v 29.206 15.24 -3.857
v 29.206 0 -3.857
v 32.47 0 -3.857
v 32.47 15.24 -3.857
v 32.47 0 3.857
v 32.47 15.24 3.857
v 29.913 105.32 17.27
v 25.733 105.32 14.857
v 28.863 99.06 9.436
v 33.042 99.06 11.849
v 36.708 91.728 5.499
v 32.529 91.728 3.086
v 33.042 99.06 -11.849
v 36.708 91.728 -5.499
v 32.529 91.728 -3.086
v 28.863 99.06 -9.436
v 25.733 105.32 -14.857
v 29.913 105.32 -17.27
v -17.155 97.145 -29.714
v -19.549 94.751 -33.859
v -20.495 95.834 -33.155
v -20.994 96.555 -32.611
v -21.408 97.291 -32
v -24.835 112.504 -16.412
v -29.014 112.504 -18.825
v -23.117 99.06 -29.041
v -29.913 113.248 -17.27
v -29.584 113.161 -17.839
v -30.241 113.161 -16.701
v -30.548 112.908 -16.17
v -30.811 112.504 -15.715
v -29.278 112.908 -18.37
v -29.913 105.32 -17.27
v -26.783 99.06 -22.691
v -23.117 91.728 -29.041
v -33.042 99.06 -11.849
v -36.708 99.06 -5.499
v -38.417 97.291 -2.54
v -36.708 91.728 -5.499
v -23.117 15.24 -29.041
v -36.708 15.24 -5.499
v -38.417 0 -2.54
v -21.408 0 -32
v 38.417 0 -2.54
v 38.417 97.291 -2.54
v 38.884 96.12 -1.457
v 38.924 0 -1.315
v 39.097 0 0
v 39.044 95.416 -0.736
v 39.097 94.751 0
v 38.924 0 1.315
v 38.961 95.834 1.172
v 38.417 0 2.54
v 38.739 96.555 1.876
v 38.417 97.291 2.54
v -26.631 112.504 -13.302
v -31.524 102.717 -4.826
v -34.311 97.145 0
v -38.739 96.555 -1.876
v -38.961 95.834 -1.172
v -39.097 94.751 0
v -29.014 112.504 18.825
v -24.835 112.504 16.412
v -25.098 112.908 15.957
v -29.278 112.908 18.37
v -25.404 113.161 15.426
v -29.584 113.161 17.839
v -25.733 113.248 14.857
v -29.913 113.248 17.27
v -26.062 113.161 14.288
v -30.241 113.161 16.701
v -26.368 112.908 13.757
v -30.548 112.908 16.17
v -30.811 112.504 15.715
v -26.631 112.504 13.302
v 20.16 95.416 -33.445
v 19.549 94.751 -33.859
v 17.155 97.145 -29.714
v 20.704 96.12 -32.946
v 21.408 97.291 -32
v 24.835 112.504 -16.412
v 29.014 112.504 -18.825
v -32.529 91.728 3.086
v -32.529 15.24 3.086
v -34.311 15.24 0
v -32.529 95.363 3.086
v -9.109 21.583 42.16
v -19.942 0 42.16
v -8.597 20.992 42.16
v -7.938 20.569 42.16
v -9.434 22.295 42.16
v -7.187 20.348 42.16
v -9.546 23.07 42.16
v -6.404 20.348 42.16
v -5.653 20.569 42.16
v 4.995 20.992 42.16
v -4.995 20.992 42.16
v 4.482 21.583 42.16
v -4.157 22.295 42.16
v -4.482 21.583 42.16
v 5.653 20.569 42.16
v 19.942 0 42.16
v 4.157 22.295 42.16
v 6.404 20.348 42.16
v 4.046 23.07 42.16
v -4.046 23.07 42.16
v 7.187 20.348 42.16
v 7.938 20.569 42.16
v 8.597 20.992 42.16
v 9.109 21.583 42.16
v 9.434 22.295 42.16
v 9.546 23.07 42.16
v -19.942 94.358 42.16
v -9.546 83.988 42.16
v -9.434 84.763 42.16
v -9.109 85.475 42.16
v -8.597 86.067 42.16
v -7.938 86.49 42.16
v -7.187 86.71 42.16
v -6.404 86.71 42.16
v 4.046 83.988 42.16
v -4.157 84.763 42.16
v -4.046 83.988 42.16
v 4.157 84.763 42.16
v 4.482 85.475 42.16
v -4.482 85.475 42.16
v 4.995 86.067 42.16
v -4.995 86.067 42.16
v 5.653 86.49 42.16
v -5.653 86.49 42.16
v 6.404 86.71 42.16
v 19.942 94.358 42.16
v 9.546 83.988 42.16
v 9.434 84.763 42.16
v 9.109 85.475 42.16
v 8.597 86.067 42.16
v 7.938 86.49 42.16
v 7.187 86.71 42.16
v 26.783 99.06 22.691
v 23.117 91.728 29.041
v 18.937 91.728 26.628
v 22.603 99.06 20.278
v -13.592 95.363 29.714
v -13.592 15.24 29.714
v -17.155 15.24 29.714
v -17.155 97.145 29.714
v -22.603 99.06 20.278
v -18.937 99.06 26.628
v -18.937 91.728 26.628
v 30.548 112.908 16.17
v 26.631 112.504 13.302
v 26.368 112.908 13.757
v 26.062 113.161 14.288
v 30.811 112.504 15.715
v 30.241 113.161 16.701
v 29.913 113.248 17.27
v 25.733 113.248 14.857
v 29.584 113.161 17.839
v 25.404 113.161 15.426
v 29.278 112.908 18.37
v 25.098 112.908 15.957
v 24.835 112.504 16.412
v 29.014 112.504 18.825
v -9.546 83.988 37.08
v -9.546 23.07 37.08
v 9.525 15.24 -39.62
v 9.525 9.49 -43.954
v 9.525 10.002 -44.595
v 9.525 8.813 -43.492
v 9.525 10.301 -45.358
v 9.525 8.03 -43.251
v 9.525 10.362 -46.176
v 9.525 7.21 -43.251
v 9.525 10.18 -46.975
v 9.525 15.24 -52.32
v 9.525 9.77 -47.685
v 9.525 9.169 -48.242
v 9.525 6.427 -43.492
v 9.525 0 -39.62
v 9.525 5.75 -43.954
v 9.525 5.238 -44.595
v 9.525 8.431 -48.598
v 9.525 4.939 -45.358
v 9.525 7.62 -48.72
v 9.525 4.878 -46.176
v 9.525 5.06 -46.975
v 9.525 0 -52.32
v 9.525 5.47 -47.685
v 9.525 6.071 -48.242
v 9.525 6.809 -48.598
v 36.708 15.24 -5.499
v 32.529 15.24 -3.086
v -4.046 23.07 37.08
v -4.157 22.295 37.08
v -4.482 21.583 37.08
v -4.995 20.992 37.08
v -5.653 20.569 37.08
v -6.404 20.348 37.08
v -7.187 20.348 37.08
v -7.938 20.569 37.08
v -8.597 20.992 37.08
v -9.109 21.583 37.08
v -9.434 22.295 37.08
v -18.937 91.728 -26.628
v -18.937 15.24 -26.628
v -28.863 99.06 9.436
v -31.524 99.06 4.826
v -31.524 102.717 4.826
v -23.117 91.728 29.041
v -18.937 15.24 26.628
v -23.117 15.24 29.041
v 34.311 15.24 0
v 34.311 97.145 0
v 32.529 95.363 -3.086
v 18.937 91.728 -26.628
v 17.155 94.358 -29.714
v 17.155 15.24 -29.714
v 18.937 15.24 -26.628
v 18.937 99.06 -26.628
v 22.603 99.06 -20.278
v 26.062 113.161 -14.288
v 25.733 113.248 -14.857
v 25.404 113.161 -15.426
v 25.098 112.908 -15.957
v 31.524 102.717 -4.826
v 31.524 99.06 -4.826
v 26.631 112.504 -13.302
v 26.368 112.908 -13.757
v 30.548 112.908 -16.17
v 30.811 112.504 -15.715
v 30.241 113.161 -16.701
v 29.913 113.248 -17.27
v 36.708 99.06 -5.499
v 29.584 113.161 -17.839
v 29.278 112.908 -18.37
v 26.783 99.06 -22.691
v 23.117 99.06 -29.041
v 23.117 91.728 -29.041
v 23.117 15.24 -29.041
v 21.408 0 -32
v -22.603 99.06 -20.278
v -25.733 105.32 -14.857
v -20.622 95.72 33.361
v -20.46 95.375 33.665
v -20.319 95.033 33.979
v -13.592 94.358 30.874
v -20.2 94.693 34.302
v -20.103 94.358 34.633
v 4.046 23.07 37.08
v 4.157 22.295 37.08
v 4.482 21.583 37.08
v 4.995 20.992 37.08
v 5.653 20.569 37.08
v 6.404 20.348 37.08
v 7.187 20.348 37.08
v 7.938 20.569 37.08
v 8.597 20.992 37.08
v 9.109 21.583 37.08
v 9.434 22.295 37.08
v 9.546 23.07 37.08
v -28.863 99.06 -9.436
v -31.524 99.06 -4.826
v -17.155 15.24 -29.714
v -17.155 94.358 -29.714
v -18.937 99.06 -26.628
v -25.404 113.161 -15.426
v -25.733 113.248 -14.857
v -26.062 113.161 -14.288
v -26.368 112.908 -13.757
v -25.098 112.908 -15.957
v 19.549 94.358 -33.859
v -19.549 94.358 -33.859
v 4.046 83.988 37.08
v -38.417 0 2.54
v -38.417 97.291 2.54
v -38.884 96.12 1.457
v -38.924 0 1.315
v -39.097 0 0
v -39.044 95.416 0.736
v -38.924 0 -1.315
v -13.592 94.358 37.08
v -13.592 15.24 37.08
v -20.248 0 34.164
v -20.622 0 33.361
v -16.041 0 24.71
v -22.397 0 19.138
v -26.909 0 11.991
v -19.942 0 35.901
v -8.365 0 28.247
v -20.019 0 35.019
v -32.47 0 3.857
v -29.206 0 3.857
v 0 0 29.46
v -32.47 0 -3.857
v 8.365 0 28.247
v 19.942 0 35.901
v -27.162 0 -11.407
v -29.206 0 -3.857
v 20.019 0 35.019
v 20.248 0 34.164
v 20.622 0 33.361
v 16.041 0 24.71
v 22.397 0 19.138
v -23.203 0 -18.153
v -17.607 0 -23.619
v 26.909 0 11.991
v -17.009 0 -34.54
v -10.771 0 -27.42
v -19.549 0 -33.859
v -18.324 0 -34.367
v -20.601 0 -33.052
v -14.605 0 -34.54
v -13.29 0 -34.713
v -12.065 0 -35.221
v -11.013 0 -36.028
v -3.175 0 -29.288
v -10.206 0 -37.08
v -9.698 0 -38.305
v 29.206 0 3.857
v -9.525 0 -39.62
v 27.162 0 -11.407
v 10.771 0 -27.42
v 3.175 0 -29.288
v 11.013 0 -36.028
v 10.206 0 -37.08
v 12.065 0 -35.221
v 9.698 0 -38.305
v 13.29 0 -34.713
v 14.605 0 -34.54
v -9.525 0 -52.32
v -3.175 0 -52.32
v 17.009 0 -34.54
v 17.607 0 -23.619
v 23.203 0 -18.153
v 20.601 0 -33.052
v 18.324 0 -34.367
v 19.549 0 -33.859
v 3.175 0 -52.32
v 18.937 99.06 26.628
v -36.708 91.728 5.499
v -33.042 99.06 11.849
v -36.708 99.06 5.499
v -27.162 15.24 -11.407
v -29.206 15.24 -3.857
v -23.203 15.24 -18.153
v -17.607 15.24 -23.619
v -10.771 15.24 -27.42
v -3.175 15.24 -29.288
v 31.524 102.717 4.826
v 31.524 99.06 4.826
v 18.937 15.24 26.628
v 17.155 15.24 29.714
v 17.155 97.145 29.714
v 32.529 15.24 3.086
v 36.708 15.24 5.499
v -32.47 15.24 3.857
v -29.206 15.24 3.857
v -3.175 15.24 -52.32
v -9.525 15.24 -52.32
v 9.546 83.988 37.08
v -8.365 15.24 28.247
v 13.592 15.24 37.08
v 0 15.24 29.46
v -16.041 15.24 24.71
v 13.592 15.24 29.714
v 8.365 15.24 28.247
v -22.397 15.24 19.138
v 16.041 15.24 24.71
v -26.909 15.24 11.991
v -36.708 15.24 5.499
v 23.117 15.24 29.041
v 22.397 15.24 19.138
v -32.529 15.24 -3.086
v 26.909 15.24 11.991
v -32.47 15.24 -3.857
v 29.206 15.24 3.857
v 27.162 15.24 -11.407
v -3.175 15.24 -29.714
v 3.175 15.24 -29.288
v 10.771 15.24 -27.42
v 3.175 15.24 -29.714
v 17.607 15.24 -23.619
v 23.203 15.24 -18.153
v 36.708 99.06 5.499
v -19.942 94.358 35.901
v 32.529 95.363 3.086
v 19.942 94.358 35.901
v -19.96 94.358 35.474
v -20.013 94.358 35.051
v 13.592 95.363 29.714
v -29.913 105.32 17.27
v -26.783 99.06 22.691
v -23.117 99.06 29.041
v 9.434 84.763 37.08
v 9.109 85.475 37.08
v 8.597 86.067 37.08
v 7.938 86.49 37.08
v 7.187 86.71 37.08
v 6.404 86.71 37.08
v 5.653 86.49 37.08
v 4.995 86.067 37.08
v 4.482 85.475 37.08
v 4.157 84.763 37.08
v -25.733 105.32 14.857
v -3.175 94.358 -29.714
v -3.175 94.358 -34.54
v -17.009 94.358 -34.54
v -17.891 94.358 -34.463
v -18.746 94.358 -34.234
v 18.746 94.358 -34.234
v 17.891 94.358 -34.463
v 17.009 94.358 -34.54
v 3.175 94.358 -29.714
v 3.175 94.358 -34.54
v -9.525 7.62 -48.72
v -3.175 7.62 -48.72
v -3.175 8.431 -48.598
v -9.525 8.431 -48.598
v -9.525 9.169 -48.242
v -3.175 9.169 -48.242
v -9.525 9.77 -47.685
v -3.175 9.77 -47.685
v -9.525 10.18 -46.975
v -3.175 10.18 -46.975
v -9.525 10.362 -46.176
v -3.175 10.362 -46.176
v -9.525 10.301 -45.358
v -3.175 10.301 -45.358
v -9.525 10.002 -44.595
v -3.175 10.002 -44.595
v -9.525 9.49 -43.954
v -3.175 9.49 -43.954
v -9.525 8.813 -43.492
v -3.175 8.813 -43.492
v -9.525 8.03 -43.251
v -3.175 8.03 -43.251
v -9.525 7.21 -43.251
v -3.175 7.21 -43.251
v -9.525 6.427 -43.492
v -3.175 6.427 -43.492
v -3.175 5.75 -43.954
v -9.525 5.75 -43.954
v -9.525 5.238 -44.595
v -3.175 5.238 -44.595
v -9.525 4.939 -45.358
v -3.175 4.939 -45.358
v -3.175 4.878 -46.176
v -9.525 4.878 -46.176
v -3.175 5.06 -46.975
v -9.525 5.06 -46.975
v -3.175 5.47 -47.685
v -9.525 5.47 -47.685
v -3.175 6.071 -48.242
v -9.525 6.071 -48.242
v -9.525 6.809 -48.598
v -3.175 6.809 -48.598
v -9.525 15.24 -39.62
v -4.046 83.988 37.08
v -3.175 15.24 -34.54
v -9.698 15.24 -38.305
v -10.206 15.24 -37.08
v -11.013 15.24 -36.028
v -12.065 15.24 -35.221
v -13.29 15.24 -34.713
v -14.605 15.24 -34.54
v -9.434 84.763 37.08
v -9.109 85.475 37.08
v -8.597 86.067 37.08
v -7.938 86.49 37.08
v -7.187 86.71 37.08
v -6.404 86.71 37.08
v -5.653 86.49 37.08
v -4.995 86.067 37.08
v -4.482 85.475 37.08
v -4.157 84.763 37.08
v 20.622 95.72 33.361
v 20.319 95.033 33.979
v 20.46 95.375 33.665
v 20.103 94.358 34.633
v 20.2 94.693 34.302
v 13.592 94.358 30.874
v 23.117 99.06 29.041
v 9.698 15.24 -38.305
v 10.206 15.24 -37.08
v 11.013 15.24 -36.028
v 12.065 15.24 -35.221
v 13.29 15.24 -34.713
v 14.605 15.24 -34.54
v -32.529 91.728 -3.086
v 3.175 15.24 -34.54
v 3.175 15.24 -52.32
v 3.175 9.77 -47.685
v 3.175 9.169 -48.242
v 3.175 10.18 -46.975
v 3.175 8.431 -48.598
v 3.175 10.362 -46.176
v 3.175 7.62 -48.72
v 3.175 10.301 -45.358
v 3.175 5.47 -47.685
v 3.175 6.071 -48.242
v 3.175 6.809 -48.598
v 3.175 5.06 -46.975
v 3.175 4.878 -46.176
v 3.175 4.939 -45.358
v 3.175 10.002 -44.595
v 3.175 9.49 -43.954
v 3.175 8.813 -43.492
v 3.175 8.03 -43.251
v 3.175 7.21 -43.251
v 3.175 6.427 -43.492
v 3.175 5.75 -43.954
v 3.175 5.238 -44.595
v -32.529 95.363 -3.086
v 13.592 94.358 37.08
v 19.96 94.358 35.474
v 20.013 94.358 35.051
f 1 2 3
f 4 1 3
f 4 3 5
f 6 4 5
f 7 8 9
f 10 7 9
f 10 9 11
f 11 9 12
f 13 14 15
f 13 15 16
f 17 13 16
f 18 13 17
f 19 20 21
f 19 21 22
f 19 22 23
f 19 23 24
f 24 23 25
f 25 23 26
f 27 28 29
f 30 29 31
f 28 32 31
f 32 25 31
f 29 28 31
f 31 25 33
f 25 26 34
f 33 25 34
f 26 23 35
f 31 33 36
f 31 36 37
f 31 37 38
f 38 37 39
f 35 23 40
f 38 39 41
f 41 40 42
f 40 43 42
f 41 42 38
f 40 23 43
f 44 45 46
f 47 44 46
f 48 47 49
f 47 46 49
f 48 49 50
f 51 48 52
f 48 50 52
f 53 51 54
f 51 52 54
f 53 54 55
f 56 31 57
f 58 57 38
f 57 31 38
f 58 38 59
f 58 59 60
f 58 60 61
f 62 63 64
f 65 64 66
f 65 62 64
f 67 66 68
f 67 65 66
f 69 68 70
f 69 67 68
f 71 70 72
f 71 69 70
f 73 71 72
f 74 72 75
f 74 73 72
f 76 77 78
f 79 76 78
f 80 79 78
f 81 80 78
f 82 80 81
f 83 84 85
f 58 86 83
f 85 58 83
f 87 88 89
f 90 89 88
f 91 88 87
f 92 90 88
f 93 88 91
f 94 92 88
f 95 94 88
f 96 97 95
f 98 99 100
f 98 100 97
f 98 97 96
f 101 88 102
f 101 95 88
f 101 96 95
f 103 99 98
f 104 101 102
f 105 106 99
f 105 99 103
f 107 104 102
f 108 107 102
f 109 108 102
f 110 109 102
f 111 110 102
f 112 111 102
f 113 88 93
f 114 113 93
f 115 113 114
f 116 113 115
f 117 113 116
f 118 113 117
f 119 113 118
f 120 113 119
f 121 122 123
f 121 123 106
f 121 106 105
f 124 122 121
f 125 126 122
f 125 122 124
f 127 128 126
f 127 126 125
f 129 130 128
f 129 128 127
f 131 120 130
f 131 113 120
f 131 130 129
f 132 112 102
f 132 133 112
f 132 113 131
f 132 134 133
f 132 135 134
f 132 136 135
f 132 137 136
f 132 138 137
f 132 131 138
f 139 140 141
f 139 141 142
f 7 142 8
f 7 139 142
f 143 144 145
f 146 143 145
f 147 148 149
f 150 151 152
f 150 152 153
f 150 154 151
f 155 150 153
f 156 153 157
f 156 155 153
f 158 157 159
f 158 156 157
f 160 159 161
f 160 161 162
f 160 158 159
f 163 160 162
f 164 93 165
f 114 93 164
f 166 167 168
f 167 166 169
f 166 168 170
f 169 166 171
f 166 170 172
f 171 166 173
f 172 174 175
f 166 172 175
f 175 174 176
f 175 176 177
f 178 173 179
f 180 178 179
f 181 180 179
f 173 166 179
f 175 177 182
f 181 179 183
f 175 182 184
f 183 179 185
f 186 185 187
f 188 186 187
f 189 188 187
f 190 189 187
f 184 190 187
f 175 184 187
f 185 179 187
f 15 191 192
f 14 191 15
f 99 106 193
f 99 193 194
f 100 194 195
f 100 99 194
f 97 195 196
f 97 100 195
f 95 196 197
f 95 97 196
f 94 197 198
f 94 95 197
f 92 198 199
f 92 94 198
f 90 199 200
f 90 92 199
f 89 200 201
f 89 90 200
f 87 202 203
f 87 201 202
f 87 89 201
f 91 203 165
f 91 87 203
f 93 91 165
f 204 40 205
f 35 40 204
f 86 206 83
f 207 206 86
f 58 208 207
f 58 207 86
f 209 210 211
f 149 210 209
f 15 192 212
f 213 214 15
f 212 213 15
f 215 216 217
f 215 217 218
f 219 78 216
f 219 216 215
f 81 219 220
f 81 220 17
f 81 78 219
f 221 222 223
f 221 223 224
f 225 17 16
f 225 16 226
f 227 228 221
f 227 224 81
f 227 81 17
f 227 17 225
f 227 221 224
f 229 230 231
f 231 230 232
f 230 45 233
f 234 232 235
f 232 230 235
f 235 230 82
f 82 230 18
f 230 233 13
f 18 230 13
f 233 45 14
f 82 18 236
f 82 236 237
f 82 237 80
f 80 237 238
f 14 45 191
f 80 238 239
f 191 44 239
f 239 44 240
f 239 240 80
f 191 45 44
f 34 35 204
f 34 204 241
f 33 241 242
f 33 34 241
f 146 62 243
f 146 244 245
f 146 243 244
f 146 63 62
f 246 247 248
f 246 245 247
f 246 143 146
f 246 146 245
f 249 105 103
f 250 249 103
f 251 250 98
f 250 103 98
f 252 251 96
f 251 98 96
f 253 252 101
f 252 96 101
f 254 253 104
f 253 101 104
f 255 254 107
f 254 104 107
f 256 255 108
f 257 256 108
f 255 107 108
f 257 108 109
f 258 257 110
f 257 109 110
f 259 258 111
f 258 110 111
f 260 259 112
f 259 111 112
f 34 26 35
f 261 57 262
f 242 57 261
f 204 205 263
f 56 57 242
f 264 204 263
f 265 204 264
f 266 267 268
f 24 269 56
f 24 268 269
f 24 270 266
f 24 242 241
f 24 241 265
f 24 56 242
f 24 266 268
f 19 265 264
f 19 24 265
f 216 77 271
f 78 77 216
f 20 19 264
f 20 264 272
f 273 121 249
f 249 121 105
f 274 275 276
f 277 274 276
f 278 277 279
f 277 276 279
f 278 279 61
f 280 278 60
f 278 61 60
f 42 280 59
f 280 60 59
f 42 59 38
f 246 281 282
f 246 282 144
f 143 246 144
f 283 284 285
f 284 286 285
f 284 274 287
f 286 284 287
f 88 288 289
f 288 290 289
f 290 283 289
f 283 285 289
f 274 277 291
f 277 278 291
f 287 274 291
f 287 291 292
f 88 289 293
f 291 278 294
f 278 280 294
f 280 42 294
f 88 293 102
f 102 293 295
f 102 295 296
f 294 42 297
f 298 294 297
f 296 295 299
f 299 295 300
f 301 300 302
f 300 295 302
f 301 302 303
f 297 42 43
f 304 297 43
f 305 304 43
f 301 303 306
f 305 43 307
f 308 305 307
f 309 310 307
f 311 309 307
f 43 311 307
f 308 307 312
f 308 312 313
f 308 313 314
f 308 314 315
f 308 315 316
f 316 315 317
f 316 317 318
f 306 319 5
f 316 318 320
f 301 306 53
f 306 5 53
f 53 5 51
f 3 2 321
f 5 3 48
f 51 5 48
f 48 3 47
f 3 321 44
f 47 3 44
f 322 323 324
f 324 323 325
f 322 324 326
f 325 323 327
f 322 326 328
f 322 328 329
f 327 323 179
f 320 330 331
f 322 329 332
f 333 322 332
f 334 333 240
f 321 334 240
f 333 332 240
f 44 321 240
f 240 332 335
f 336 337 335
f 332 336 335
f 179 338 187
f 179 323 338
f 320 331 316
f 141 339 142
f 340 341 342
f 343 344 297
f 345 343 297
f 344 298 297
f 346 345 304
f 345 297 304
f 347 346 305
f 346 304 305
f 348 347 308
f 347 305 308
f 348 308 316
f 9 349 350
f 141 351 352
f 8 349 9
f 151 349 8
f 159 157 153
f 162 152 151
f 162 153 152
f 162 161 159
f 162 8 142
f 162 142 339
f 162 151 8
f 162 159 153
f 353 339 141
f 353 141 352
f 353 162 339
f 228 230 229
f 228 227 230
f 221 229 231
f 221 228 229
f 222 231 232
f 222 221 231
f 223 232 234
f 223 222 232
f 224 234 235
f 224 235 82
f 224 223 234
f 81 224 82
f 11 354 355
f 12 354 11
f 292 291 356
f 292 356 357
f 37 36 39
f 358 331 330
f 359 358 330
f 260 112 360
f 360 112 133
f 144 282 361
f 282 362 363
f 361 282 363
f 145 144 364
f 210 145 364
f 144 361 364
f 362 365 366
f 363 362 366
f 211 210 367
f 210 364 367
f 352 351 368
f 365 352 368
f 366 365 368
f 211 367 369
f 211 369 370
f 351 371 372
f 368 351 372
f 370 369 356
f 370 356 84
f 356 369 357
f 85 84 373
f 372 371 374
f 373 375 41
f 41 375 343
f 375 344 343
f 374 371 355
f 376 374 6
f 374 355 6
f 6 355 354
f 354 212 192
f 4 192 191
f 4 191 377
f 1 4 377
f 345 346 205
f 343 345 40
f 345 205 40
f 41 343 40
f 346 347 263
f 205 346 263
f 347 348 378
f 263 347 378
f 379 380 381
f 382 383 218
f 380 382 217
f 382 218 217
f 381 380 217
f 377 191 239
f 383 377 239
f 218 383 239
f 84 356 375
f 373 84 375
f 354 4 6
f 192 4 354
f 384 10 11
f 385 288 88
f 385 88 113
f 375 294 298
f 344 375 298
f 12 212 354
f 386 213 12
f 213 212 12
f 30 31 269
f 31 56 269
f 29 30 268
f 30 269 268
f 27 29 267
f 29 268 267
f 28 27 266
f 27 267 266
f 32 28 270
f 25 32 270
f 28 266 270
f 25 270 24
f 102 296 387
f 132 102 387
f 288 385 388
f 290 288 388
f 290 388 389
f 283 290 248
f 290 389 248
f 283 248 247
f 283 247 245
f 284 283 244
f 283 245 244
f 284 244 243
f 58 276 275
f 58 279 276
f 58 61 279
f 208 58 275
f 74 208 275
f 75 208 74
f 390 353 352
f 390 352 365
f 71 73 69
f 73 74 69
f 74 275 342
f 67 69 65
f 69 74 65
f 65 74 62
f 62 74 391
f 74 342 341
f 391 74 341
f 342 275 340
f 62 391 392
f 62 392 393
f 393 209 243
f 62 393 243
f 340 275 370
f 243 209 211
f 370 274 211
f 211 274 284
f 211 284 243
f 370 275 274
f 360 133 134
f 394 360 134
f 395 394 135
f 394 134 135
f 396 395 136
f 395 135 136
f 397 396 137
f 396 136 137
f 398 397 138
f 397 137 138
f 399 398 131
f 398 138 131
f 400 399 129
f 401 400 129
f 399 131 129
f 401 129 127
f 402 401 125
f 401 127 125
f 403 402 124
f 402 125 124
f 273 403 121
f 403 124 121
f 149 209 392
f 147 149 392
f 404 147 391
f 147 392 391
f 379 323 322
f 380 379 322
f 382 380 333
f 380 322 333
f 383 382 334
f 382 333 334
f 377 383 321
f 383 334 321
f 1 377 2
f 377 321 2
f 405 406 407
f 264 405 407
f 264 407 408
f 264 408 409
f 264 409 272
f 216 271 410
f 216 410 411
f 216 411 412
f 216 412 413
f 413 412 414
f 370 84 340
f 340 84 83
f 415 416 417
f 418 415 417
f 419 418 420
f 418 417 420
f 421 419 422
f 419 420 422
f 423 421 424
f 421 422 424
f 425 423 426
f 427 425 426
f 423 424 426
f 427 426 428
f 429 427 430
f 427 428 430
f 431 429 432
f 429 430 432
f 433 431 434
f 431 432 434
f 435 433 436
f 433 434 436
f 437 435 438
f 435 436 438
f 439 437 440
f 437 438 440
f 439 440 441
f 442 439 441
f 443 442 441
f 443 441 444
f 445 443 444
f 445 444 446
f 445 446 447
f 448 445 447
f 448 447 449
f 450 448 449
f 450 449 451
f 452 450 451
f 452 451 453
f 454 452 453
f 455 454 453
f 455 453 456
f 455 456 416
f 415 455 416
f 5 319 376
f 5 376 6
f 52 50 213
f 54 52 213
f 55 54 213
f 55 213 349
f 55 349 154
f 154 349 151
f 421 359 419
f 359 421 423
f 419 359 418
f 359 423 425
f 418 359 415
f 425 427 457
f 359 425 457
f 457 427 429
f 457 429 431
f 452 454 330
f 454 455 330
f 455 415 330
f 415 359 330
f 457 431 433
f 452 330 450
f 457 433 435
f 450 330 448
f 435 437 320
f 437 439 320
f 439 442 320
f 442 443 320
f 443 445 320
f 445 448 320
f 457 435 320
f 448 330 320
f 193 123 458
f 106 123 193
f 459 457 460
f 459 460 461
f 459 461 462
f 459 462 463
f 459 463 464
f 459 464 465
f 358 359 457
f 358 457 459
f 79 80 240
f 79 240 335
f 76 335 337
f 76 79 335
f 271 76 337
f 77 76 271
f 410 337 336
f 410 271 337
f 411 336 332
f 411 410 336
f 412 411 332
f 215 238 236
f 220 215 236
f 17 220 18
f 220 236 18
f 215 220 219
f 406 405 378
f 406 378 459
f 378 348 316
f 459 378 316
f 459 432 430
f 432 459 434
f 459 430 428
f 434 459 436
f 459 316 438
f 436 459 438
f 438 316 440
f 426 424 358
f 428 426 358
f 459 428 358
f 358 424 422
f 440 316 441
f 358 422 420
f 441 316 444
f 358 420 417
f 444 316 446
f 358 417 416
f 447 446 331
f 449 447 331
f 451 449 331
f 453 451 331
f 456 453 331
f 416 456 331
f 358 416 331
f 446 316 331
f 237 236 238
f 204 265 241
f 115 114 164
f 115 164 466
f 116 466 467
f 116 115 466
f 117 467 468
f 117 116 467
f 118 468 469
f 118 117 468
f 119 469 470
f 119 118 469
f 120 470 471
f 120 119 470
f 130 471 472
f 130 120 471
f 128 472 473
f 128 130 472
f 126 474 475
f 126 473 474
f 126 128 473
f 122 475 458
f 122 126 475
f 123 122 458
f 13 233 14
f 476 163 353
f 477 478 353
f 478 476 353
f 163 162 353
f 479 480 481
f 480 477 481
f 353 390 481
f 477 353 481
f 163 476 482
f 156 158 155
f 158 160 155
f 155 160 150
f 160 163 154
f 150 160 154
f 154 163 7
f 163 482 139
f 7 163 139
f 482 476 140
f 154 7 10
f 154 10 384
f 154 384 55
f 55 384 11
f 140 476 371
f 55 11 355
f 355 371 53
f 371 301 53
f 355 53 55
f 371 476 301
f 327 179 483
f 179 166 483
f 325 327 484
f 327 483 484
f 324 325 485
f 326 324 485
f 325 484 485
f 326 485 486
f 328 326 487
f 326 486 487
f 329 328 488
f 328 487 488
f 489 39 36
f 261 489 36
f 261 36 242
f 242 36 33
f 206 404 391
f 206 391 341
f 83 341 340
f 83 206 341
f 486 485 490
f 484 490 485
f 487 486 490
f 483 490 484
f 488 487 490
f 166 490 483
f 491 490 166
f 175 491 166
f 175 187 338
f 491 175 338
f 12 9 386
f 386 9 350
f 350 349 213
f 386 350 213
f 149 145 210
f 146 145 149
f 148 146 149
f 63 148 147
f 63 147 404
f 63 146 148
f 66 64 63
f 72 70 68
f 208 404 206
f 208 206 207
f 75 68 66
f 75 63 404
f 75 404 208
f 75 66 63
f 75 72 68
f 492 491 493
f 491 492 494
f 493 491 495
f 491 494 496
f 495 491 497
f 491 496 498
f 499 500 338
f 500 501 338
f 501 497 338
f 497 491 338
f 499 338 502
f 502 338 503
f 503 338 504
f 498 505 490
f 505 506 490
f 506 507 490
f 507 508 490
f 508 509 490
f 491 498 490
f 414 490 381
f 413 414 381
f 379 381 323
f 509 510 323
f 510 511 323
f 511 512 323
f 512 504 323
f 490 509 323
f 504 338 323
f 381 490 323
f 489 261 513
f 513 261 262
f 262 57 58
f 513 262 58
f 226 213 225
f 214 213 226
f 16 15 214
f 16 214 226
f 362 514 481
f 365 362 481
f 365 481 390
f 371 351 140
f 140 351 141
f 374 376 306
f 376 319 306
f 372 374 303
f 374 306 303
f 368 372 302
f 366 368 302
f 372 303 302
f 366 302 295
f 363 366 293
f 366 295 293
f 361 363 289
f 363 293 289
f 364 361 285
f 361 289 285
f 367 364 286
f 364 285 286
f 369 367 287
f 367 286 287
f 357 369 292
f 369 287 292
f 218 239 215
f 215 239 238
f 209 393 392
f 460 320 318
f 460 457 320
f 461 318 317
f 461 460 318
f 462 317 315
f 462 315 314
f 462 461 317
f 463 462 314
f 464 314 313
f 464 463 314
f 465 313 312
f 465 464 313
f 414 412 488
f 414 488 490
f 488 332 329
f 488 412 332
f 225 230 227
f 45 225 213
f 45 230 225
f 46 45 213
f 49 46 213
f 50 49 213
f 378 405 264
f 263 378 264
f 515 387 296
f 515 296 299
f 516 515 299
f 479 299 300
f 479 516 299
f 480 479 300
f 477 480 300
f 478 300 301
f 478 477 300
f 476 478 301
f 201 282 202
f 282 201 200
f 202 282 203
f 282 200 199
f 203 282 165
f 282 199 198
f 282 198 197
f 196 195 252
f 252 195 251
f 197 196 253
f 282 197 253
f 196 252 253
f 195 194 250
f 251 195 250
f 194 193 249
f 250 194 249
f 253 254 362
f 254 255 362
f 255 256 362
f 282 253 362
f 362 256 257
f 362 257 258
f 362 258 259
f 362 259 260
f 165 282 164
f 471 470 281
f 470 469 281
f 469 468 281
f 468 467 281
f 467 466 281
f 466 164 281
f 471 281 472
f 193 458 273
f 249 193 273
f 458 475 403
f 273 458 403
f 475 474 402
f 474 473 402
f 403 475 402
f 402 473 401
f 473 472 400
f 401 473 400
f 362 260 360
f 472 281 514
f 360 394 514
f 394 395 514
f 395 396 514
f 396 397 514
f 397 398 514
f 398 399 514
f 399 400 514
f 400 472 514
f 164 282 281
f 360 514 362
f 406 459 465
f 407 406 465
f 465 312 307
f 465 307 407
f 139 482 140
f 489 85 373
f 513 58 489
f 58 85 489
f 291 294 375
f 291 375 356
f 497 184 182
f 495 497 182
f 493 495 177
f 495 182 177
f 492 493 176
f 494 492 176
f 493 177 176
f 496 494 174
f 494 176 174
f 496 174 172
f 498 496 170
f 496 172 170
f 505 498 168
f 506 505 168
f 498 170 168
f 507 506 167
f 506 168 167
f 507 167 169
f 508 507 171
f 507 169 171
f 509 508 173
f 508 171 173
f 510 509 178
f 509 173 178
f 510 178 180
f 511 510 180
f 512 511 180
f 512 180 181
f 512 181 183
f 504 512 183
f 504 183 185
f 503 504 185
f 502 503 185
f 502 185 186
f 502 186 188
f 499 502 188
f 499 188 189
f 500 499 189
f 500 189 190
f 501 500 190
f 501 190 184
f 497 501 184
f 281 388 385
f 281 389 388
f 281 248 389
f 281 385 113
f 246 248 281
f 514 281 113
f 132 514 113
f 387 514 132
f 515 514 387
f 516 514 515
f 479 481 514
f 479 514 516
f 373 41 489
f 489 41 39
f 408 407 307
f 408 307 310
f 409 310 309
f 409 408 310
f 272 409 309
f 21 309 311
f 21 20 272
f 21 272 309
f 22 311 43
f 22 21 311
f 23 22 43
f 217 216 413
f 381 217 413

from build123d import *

# Parameters (mm, degrees)
BOSS_EXTRUDE1_DEPTH  = 114.3
SKETCH2_W            = 6.35
SKETCH2_H            = 17.78
CUT_EXTRUDE2_DEPTH   = 99.06
SKETCH3_W            = 27.183356596
SKETCH3_H            = 83.82
CUT_EXTRUDE3_DEPTH   = 99.06
SKETCH4_W            = 27.183356596
SKETCH4_H            = 83.82
CUT_EXTRUDE4_DEPTH   = 99.06
SKETCH7_W            = 3.263536018
SKETCH7_H            = 7.713600016
CUT_EXTRUDE7_DEPTH   = 15.24
CUT_EXTRUDE8_DEPTH   = 99.06
SKETCH10_W           = 39.883356596
SKETCH10_H           = 114.3
BOSS_EXTRUDE2_DEPTH  = 7.62
CUT_EXTRUDE11_DEPTH  = 81.28
BOSS_EXTRUDE9_DEPTH  = 4.826
MIRROR9_COPY_1_DEPTH = 4.826
MIRROR9_COPY_2_DEPTH = 4.826
CUT_EXTRUDE13_DEPTH  = 19.941678176
CUT_EXTRUDE14_DEPTH  = 19.941678176
SKETCH17_W           = 27.183356538
SKETCH17_H           = 4.826
CUT_EXTRUDE15_DEPTH  = 99.06
SKETCH18_W           = 39.883356596
SKETCH18_H           = 7.62
CUT_EXTRUDE16_DEPTH  = 19.941678176
CUT_EXTRUDE18_DEPTH  = 19.941678176
SKETCH20_W           = 27.183356538
SKETCH20_H           = 2.54
CUT_EXTRUDE19_DEPTH  = 79.118321824
FILLET1_R            = 5.08
FILLET2_R            = 2.54
SKETCH21_R           = 2.749999961
CUT_EXTRUDE20_DEPTH  = 79.118321824


with BuildPart() as part:
    # Sketch1 → Boss-Extrude1 (new body)
    with BuildSketch(Plane(origin=(0, 0, 0), x_dir=(1, 0, 0), z_dir=(0, 1, 0))):
        with BuildLine():
            Line((39.883356596, 0), (19.941678298, 34.54))
            Line((19.941678298, 34.54), (9.525, 34.54))
            Line((9.525, 34.54), (9.525, 52.32))
            Line((9.525, 52.32), (3.175, 52.32))
            Line((3.175, 52.32), (3.175, 34.54))
            Line((3.175, 34.54), (3.175, 29.28841025))
            ThreePointArc((3.175, 29.28841025), (0, -29.46), (-3.175, 29.28841025))
            Line((-3.175, 29.28841025), (-3.175, 34.54))
            Line((-3.175, 34.54), (-3.175, 52.32))
            Line((-3.175, 52.32), (-9.525, 52.32))
            Line((-9.525, 52.32), (-9.525, 34.54))
            Line((-9.525, 34.54), (-19.941678298, 34.54))
            Line((-19.941678298, 34.54), (-39.883356596, 0))
            Line((-39.883356596, 0), (-19.941678298, -34.54))
            Line((-19.941678298, -34.54), (19.941678298, -34.54))
            Line((19.941678298, -34.54), (39.883356596, 0))
        make_face()
    extrude(amount=BOSS_EXTRUDE1_DEPTH)

    # Sketch2 → Cut-Extrude2 (cut)
    with BuildSketch(Plane(origin=(0, 114.3, 0), x_dir=(1, 0, 0), z_dir=(0, 1, 0))):
        with Locations((-6.35, 43.43)):
            Rectangle(SKETCH2_W, SKETCH2_H)
        with Locations((6.35, 43.43)):
            Rectangle(SKETCH2_W, SKETCH2_H)
    extrude(amount=-CUT_EXTRUDE2_DEPTH, mode=Mode.SUBTRACT)

    # Sketch3 → Cut-Extrude3 (cut)
    with BuildSketch(Plane(origin=(-29.912517447, 0, -17.27), x_dir=(-0.49999999999999617, 0, 0.8660254037844409), z_dir=(-0.8660254037844408, 0, -0.4999999999999961))):
        with Locations((0, 57.15)):
            Rectangle(SKETCH3_W, SKETCH3_H)
    extrude(amount=-CUT_EXTRUDE3_DEPTH, mode=Mode.SUBTRACT)

    # Sketch4 → Cut-Extrude4 (cut)
    with BuildSketch(Plane(origin=(29.912517447, 0, -17.27), x_dir=(-0.500000000000004, 0, -0.8660254037844364), z_dir=(0.8660254037844365, 0, -0.500000000000004))):
        with Locations((0, 57.15)):
            Rectangle(SKETCH4_W, SKETCH4_H)
    extrude(amount=-CUT_EXTRUDE4_DEPTH, mode=Mode.SUBTRACT)

    # Sketch7 → Cut-Extrude7 (cut)
    with BuildSketch(Plane.XZ):
        with Locations((-30.838217531, 0)):
            Rectangle(SKETCH7_W, SKETCH7_H)
        with Locations((30.838217531, 0)):
            Rectangle(SKETCH7_W, SKETCH7_H)
    extrude(amount=-CUT_EXTRUDE7_DEPTH, mode=Mode.SUBTRACT)

    # Sketch8 → Cut-Extrude8 (cut)
    with BuildSketch(Plane(origin=(0, 114.3, 0), x_dir=(1, 0, 0), z_dir=(0, 1, 0))):
        Polygon((-3.175, 29.714), (3.175, 29.714), (17.155385899, 29.714), (34.310771797, 0), (17.155385899, -29.714), (-17.155385899, -29.714), (-34.310771797, 0), (-17.155385899, 29.714), align=None)
    extrude(amount=-CUT_EXTRUDE8_DEPTH, mode=Mode.SUBTRACT)

    # Sketch10 → Boss-Extrude2 (add)
    with BuildSketch(Plane.XY.offset(34.54)):
        with Locations((0, 57.15)):
            Rectangle(SKETCH10_W, SKETCH10_H)
    extrude(amount=BOSS_EXTRUDE2_DEPTH)

    # Sketch12 → Cut-Extrude11 (cut)
    with BuildSketch(Plane(origin=(-29.912517447, 0, -17.27), x_dir=(-0.4999999999999998, 0, 0.8660254037844388), z_dir=(-0.8660254037844388, 0, -0.4999999999999998))):
        Polygon((19.941678298, 114.3), (0, 114.3), (19.941678298, 94.358321702), align=None)
        Polygon((-19.941678298, 94.358321702), (0, 114.3), (-19.941678298, 114.3), align=None)
        Polygon((6.259743879, 99.06), (0, 105.319743879), (-6.259743879, 99.06), align=None)
    cut_extrude11 = extrude(amount=-CUT_EXTRUDE11_DEPTH, mode=Mode.SUBTRACT)

    # Mirror2: Cut-Extrude11 across plane
    add(cut_extrude11.mirror(Plane(origin=(0, 0, 0), x_dir=(0, 0, 1), z_dir=(1, 0, 0))), mode=Mode.SUBTRACT)

    # Sketch11 → Boss-Extrude9 (add)
    with BuildSketch(Plane(origin=(-29.912517447, 0, -17.27), x_dir=(-0.4999999999999998, 0, 0.8660254037844388), z_dir=(-0.8660254037844388, 0, -0.4999999999999998))):
        Polygon((-13.591678298, 91.728065581), (0, 105.319743879), (13.591678298, 91.728065581), (19.941678298, 94.358321702), (0, 114.3), (-19.941678298, 94.358321702), align=None)
    boss_extrude9 = extrude(amount=-BOSS_EXTRUDE9_DEPTH)

    # Mirror8: Boss-Extrude9 across plane
    add(boss_extrude9.mirror(Plane.XY))

    # Mirror9 copy 1 sketch → Mirror9 copy 1 (add)
    with BuildSketch(Plane(origin=(29.912517447, 0, 17.27), x_dir=(0.4999999999999998, 0, -0.8660254037844388), z_dir=(0.8660254037844388, 0, 0.4999999999999998))):
        Polygon((-13.591678298, 91.728065581), (0, 105.319743879), (13.591678298, 91.728065581), (19.941678298, 94.358321702), (0, 114.3), (-19.941678298, 94.358321702), align=None)
    extrude(amount=-MIRROR9_COPY_1_DEPTH)

    # Mirror9 copy 2 sketch → Mirror9 copy 2 (add)
    with BuildSketch(Plane(origin=(29.912517447, 0, -17.27), x_dir=(0.4999999999999998, 0, 0.8660254037844388), z_dir=(0.8660254037844388, 0, -0.4999999999999998))):
        Polygon((-13.591678298, -91.728065581), (0, -105.319743879), (13.591678298, -91.728065581), (19.941678298, -94.358321702), (0, -114.3), (-19.941678298, -94.358321702), align=None)
    extrude(amount=-MIRROR9_COPY_2_DEPTH)

    # Sketch15 → Cut-Extrude13 (cut)
    with BuildSketch(Plane(origin=(0, 114.3, 0), x_dir=(1, 0, 0), z_dir=(0, 1, 0))):
        Polygon((-17.155385899, 29.714), (-19.941678298, 34.54), (19.941678298, 34.54), (17.155385899, 29.714), align=None)
    extrude(amount=-CUT_EXTRUDE13_DEPTH, mode=Mode.SUBTRACT)

    # Sketch16 → Cut-Extrude14 (cut)
    with BuildSketch(Plane(origin=(0, 114.3, 0), x_dir=(1, 0, 0), z_dir=(0, 1, 0))):
        Polygon((-19.941678298, -34.54), (19.941678298, -34.54), (11.5828011, -29.714), (-11.5828011, -29.714), align=None)
    extrude(amount=-CUT_EXTRUDE14_DEPTH, mode=Mode.SUBTRACT)

    # Sketch17 → Cut-Extrude15 (cut)
    with BuildSketch(Plane(origin=(0, 114.3, 0), x_dir=(1, 0, 0), z_dir=(0, 1, 0))):
        with Locations((0, -32.127)):
            Rectangle(SKETCH17_W, SKETCH17_H)
    extrude(amount=-CUT_EXTRUDE15_DEPTH, mode=Mode.SUBTRACT)

    # Sketch18 → Cut-Extrude16 (cut)
    with BuildSketch(Plane(origin=(0, 114.3, 0), x_dir=(1, 0, 0), z_dir=(0, 1, 0))):
        with Locations((0, -38.35)):
            Rectangle(SKETCH18_W, SKETCH18_H)
    extrude(amount=-CUT_EXTRUDE16_DEPTH, mode=Mode.SUBTRACT)

    # Sketch19 → Cut-Extrude18 (cut)
    with BuildSketch(Plane.XY.offset(42.16)):
        with BuildLine():
            Line((-9.545839134, 23.07), (-9.545839134, 83.988321824))
            ThreePointArc((-9.545839134, 83.988321824), (-6.795839134, 86.738321824), (-4.045839134, 83.988321824))
            Line((-4.045839134, 83.988321824), (-4.045839134, 23.07))
            ThreePointArc((-4.045839134, 23.07), (-6.795839134, 20.32), (-9.545839134, 23.07))
        make_face()
        with BuildLine():
            Line((9.545839134, 23.07), (9.545839134, 83.988321824))
            ThreePointArc((9.545839134, 83.988321824), (6.795839134, 86.738321824), (4.045839134, 83.988321824))
            Line((4.045839134, 83.988321824), (4.045839134, 23.07))
            ThreePointArc((4.045839134, 23.07), (6.795839134, 20.32), (9.545839134, 23.07))
        make_face()
    extrude(amount=-CUT_EXTRUDE18_DEPTH, mode=Mode.SUBTRACT)

    # Sketch20 → Cut-Extrude19 (cut)
    with BuildSketch(Plane(origin=(0, 94.358321824, 0), x_dir=(1, 0, 0), z_dir=(0, 1, 0))):
        with Locations((0, -35.81)):
            Rectangle(SKETCH20_W, SKETCH20_H)
    extrude(amount=-CUT_EXTRUDE19_DEPTH, mode=Mode.SUBTRACT)

    # Fillet1
    fillet1_edges = [part.edges().sort_by_distance(p)[0] for p in [
        (19.941678298, 47.179160851, 34.54),
        (-39.883356596, 47.179160851, 0),
        (-19.941678298, 47.179160851, -34.54),
        (39.883356596, 47.179160851, 0),
        (-19.941678298, 47.179160851, 34.54),
        (19.941678298, 47.179160851, -34.54),
        (-9.525, 7.62, -34.54),
        (9.525, 7.62, -34.54),
    ]]
    fillet(fillet1_edges, radius=FILLET1_R)

    # Fillet2
    fillet2_edges = [part.edges().sort_by_distance(p)[0] for p in [
        (27.822798147, 114.3, 16.0635),
        (-27.822798147, 114.3, -16.0635),
        (-27.822798147, 114.3, 16.0635),
        (27.822798147, 114.3, -16.0635),
    ]]
    fillet(fillet2_edges, radius=FILLET2_R)

    # Sketch21 → Cut-Extrude20 (cut)
    with BuildSketch(Plane(origin=(9.525, 0, 0), x_dir=(0, 0, -1), z_dir=(1, 0, 0))):
        with Locations((45.97, 7.62)):
            Circle(SKETCH21_R)
    extrude(amount=-CUT_EXTRUDE20_DEPTH, mode=Mode.SUBTRACT)


solid = part.part
